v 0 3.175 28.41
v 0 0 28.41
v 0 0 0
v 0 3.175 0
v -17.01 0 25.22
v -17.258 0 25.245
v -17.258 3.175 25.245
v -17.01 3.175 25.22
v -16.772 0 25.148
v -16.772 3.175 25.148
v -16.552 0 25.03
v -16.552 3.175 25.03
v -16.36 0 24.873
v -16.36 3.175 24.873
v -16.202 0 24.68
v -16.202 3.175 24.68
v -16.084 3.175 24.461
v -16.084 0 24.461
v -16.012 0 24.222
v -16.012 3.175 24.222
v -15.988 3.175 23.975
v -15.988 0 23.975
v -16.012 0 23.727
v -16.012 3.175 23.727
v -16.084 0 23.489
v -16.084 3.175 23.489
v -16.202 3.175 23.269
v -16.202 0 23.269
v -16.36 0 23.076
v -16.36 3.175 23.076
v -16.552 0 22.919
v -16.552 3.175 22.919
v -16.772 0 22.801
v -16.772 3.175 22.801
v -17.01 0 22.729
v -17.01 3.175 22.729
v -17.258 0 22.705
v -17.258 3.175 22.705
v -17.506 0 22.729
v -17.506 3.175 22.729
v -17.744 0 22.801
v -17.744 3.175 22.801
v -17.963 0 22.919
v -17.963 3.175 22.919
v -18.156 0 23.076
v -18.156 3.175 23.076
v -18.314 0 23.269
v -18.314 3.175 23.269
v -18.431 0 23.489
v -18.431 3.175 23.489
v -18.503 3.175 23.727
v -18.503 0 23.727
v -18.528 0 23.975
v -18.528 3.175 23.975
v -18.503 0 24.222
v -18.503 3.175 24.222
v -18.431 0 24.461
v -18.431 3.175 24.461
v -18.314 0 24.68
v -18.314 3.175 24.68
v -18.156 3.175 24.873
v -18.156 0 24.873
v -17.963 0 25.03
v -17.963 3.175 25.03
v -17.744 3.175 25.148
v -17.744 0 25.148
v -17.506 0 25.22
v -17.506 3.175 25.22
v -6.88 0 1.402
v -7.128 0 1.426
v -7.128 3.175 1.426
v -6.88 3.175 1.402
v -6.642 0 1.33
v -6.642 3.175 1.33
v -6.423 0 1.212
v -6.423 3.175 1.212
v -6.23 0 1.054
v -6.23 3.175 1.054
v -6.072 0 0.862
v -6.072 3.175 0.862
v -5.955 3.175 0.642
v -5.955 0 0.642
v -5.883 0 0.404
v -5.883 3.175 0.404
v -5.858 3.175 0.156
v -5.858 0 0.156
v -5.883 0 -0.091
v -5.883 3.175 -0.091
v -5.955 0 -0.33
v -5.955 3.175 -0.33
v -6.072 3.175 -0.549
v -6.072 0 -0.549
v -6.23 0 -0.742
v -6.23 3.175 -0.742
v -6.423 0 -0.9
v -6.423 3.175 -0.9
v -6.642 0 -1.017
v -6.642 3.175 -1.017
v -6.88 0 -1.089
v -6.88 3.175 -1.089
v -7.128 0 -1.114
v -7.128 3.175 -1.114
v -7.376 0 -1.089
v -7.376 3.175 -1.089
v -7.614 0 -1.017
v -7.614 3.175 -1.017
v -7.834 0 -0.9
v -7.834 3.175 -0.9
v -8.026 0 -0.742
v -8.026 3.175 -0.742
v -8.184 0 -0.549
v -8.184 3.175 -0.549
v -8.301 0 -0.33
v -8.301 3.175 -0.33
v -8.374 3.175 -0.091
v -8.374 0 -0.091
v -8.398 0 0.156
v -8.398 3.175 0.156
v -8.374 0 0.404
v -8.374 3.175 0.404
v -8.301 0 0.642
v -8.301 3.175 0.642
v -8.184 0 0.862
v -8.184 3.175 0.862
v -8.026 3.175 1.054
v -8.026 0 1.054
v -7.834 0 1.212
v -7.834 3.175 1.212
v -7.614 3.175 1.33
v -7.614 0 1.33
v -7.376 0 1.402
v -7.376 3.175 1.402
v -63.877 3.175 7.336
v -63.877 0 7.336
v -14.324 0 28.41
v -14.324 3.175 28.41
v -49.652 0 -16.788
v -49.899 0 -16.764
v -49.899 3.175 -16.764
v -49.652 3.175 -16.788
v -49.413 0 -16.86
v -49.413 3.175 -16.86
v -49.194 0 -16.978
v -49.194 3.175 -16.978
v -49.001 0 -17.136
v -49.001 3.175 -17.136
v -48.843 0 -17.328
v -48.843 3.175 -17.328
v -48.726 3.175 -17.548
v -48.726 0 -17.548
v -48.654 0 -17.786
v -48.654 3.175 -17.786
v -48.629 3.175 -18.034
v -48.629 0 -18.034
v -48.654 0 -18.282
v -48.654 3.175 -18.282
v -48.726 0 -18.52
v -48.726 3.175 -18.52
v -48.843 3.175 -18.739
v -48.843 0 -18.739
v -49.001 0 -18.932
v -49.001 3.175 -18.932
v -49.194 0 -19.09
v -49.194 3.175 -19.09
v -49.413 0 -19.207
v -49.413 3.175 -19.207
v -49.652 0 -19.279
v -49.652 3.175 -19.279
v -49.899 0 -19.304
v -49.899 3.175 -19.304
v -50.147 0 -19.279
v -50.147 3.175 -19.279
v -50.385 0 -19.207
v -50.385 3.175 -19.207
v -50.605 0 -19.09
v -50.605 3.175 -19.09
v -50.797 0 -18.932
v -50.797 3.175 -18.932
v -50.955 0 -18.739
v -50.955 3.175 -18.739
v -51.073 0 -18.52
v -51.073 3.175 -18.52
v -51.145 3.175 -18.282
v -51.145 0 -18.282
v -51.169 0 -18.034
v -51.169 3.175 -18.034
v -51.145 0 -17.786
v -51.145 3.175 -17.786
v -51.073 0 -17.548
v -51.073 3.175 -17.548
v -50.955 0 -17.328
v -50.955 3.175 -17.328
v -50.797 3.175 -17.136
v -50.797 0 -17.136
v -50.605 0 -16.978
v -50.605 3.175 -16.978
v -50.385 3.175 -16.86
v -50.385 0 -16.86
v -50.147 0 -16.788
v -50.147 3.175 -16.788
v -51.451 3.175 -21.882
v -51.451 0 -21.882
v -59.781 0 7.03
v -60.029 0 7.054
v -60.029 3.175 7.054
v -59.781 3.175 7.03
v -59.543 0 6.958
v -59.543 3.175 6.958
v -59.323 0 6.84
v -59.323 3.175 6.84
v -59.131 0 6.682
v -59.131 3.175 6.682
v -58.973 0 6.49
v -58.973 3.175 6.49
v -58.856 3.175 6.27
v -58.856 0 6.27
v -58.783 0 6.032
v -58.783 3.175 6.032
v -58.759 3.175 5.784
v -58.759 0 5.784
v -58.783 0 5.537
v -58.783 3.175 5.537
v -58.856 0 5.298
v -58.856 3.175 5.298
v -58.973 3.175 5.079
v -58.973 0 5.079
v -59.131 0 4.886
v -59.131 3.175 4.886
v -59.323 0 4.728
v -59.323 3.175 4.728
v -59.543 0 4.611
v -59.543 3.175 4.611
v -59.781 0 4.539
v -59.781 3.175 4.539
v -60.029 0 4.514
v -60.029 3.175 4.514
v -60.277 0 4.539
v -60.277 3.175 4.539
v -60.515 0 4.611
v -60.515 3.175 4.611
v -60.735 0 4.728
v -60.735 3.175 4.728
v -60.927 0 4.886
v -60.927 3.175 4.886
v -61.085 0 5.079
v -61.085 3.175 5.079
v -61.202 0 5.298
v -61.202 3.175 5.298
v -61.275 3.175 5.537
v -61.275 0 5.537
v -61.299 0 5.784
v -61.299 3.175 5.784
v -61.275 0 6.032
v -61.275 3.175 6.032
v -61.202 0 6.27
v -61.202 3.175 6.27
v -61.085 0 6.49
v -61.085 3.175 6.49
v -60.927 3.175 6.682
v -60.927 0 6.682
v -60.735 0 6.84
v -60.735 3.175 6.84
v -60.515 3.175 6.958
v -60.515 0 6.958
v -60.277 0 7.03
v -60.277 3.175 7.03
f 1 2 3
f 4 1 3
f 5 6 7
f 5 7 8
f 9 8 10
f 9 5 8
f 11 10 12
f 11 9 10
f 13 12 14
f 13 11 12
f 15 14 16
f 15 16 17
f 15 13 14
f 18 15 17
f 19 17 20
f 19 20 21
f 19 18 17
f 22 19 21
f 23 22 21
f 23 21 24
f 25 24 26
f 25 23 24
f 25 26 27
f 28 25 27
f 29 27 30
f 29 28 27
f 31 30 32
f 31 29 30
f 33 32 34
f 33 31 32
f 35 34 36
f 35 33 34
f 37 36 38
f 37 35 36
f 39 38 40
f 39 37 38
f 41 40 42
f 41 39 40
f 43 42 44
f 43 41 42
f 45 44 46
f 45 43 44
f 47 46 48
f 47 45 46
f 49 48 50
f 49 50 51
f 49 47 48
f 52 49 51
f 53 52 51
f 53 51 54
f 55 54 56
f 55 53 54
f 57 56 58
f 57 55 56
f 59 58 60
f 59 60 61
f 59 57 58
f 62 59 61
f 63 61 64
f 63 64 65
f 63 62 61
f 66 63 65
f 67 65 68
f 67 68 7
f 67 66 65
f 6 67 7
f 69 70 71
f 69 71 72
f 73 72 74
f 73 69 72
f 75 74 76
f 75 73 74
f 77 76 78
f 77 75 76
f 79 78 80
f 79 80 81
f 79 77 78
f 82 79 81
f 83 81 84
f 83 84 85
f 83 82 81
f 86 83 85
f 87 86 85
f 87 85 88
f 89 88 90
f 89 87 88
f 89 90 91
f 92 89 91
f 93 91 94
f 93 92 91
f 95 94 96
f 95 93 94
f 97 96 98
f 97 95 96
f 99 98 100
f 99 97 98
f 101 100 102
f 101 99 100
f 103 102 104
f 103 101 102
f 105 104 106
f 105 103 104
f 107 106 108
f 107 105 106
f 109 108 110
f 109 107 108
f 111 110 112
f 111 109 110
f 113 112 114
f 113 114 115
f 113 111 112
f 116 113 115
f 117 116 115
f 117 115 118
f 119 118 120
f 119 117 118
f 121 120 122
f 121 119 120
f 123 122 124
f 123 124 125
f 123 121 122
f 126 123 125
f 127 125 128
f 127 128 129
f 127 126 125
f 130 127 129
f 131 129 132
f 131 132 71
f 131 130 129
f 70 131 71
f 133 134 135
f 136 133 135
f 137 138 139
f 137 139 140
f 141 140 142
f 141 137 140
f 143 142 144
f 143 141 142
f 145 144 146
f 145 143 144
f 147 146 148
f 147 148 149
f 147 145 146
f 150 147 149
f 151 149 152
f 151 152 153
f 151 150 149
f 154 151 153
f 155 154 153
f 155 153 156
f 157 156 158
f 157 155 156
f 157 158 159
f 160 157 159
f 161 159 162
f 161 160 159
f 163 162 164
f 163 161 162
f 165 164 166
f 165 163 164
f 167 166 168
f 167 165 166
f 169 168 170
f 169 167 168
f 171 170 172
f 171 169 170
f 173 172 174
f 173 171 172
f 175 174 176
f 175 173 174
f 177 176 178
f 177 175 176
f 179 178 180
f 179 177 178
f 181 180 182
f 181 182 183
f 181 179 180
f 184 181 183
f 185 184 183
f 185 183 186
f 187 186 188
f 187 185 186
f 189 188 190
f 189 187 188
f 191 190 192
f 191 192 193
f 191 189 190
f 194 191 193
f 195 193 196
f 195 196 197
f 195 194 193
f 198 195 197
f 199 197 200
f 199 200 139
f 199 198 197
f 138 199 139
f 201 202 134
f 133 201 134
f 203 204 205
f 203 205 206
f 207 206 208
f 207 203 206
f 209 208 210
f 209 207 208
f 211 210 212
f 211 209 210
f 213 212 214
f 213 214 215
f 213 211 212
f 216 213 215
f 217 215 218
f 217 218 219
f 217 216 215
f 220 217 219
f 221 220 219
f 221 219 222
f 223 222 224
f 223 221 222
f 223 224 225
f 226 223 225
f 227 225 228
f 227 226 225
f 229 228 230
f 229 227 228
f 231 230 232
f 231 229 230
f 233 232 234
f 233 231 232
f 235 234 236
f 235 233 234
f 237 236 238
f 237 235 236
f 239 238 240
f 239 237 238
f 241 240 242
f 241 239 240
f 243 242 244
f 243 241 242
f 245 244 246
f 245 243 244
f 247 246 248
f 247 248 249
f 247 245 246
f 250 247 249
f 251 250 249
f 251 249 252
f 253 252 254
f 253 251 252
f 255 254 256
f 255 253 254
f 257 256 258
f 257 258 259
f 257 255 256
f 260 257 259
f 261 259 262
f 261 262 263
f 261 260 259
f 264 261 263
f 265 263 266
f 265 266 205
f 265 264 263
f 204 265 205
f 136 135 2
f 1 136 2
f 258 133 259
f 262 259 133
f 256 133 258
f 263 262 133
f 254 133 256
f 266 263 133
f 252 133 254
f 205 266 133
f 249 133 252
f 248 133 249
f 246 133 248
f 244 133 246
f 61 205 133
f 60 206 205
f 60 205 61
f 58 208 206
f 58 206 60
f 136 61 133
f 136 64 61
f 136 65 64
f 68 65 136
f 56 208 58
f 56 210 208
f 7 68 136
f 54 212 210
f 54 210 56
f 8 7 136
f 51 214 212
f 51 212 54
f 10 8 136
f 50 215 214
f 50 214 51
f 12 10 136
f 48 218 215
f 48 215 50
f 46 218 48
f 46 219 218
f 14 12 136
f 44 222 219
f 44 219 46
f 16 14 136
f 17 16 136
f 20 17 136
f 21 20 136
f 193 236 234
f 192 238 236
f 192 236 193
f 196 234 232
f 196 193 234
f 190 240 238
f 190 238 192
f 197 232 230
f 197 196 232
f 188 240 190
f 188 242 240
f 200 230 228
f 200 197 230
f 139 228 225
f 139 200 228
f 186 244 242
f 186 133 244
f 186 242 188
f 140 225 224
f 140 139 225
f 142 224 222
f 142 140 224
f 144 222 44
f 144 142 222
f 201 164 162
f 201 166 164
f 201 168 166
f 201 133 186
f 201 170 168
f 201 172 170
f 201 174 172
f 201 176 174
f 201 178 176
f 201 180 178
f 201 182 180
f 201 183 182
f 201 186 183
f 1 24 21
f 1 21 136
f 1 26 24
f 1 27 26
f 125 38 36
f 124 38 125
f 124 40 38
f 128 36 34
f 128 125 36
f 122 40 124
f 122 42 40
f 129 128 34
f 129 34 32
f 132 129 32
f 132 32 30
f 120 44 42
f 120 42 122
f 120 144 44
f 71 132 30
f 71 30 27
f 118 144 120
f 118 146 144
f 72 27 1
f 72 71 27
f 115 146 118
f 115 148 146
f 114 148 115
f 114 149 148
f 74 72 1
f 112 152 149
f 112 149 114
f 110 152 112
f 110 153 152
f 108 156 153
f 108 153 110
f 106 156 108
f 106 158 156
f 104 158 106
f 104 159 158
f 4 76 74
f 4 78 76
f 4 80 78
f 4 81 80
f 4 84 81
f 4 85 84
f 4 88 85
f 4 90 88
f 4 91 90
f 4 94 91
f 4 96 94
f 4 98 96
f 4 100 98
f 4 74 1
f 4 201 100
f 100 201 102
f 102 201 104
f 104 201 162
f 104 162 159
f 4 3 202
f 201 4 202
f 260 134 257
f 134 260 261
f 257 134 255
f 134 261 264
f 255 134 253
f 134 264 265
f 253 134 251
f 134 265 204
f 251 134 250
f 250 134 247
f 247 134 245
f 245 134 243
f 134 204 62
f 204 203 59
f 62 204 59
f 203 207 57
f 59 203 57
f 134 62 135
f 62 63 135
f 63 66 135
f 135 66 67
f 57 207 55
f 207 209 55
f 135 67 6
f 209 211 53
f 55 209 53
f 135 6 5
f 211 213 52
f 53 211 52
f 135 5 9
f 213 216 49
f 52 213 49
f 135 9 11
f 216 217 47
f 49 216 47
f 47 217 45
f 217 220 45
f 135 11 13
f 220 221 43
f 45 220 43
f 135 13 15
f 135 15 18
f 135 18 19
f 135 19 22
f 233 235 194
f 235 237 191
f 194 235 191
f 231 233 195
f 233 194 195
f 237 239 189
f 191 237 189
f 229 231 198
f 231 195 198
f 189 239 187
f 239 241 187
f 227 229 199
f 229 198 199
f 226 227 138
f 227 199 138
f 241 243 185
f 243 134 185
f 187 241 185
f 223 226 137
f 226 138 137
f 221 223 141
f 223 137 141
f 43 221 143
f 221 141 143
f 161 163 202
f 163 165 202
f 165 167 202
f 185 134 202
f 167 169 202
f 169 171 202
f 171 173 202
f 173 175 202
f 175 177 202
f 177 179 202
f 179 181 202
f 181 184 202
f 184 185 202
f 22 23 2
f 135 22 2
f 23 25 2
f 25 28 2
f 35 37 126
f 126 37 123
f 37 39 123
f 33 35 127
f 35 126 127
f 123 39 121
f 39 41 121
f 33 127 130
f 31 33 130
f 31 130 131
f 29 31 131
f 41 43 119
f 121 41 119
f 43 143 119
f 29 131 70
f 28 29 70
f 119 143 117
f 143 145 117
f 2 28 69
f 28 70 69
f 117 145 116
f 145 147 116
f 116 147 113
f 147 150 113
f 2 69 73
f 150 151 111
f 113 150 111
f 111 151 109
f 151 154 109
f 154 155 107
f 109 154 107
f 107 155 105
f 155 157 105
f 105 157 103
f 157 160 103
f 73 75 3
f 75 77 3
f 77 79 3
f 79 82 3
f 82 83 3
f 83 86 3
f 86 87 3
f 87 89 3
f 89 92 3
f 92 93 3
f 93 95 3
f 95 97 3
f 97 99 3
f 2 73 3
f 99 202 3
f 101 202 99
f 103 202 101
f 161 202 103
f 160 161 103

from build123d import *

# Parameters (mm, degrees)
SKETCH1_R           = 1.27
BOSS_EXTRUDE1_DEPTH = 3.175


with BuildPart() as part:
    # Sketch1 → Boss-Extrude1 (new body)
    with BuildSketch(Plane(origin=(0, 0, 0), x_dir=(1, 0, 0), z_dir=(0, 1, 0))):
        Polygon((0, 0), (-51.450921593, 21.881601753), (-63.876832212, -7.335845865), (-14.324041053, -28.410190275), (0, -28.410190275), align=None)
        with Locations(Location((-49.899383574, 18.033755451, 0), (0, 0, 270))):
            Circle(SKETCH1_R, mode=Mode.SUBTRACT)
        with Locations(Location((-60.028985911, -5.784307846, 0), (0, 0, 270))):
            Circle(SKETCH1_R, mode=Mode.SUBTRACT)
        with Locations(Location((-17.257741053, -23.974523249, 0), (0, 0, 270))):
            Circle(SKETCH1_R, mode=Mode.SUBTRACT)
        with Locations(Location((-7.128138716, -0.156459951, 0), (0, 0, 270))):
            Circle(SKETCH1_R, mode=Mode.SUBTRACT)
    extrude(amount=BOSS_EXTRUDE1_DEPTH)


solid = part.part
